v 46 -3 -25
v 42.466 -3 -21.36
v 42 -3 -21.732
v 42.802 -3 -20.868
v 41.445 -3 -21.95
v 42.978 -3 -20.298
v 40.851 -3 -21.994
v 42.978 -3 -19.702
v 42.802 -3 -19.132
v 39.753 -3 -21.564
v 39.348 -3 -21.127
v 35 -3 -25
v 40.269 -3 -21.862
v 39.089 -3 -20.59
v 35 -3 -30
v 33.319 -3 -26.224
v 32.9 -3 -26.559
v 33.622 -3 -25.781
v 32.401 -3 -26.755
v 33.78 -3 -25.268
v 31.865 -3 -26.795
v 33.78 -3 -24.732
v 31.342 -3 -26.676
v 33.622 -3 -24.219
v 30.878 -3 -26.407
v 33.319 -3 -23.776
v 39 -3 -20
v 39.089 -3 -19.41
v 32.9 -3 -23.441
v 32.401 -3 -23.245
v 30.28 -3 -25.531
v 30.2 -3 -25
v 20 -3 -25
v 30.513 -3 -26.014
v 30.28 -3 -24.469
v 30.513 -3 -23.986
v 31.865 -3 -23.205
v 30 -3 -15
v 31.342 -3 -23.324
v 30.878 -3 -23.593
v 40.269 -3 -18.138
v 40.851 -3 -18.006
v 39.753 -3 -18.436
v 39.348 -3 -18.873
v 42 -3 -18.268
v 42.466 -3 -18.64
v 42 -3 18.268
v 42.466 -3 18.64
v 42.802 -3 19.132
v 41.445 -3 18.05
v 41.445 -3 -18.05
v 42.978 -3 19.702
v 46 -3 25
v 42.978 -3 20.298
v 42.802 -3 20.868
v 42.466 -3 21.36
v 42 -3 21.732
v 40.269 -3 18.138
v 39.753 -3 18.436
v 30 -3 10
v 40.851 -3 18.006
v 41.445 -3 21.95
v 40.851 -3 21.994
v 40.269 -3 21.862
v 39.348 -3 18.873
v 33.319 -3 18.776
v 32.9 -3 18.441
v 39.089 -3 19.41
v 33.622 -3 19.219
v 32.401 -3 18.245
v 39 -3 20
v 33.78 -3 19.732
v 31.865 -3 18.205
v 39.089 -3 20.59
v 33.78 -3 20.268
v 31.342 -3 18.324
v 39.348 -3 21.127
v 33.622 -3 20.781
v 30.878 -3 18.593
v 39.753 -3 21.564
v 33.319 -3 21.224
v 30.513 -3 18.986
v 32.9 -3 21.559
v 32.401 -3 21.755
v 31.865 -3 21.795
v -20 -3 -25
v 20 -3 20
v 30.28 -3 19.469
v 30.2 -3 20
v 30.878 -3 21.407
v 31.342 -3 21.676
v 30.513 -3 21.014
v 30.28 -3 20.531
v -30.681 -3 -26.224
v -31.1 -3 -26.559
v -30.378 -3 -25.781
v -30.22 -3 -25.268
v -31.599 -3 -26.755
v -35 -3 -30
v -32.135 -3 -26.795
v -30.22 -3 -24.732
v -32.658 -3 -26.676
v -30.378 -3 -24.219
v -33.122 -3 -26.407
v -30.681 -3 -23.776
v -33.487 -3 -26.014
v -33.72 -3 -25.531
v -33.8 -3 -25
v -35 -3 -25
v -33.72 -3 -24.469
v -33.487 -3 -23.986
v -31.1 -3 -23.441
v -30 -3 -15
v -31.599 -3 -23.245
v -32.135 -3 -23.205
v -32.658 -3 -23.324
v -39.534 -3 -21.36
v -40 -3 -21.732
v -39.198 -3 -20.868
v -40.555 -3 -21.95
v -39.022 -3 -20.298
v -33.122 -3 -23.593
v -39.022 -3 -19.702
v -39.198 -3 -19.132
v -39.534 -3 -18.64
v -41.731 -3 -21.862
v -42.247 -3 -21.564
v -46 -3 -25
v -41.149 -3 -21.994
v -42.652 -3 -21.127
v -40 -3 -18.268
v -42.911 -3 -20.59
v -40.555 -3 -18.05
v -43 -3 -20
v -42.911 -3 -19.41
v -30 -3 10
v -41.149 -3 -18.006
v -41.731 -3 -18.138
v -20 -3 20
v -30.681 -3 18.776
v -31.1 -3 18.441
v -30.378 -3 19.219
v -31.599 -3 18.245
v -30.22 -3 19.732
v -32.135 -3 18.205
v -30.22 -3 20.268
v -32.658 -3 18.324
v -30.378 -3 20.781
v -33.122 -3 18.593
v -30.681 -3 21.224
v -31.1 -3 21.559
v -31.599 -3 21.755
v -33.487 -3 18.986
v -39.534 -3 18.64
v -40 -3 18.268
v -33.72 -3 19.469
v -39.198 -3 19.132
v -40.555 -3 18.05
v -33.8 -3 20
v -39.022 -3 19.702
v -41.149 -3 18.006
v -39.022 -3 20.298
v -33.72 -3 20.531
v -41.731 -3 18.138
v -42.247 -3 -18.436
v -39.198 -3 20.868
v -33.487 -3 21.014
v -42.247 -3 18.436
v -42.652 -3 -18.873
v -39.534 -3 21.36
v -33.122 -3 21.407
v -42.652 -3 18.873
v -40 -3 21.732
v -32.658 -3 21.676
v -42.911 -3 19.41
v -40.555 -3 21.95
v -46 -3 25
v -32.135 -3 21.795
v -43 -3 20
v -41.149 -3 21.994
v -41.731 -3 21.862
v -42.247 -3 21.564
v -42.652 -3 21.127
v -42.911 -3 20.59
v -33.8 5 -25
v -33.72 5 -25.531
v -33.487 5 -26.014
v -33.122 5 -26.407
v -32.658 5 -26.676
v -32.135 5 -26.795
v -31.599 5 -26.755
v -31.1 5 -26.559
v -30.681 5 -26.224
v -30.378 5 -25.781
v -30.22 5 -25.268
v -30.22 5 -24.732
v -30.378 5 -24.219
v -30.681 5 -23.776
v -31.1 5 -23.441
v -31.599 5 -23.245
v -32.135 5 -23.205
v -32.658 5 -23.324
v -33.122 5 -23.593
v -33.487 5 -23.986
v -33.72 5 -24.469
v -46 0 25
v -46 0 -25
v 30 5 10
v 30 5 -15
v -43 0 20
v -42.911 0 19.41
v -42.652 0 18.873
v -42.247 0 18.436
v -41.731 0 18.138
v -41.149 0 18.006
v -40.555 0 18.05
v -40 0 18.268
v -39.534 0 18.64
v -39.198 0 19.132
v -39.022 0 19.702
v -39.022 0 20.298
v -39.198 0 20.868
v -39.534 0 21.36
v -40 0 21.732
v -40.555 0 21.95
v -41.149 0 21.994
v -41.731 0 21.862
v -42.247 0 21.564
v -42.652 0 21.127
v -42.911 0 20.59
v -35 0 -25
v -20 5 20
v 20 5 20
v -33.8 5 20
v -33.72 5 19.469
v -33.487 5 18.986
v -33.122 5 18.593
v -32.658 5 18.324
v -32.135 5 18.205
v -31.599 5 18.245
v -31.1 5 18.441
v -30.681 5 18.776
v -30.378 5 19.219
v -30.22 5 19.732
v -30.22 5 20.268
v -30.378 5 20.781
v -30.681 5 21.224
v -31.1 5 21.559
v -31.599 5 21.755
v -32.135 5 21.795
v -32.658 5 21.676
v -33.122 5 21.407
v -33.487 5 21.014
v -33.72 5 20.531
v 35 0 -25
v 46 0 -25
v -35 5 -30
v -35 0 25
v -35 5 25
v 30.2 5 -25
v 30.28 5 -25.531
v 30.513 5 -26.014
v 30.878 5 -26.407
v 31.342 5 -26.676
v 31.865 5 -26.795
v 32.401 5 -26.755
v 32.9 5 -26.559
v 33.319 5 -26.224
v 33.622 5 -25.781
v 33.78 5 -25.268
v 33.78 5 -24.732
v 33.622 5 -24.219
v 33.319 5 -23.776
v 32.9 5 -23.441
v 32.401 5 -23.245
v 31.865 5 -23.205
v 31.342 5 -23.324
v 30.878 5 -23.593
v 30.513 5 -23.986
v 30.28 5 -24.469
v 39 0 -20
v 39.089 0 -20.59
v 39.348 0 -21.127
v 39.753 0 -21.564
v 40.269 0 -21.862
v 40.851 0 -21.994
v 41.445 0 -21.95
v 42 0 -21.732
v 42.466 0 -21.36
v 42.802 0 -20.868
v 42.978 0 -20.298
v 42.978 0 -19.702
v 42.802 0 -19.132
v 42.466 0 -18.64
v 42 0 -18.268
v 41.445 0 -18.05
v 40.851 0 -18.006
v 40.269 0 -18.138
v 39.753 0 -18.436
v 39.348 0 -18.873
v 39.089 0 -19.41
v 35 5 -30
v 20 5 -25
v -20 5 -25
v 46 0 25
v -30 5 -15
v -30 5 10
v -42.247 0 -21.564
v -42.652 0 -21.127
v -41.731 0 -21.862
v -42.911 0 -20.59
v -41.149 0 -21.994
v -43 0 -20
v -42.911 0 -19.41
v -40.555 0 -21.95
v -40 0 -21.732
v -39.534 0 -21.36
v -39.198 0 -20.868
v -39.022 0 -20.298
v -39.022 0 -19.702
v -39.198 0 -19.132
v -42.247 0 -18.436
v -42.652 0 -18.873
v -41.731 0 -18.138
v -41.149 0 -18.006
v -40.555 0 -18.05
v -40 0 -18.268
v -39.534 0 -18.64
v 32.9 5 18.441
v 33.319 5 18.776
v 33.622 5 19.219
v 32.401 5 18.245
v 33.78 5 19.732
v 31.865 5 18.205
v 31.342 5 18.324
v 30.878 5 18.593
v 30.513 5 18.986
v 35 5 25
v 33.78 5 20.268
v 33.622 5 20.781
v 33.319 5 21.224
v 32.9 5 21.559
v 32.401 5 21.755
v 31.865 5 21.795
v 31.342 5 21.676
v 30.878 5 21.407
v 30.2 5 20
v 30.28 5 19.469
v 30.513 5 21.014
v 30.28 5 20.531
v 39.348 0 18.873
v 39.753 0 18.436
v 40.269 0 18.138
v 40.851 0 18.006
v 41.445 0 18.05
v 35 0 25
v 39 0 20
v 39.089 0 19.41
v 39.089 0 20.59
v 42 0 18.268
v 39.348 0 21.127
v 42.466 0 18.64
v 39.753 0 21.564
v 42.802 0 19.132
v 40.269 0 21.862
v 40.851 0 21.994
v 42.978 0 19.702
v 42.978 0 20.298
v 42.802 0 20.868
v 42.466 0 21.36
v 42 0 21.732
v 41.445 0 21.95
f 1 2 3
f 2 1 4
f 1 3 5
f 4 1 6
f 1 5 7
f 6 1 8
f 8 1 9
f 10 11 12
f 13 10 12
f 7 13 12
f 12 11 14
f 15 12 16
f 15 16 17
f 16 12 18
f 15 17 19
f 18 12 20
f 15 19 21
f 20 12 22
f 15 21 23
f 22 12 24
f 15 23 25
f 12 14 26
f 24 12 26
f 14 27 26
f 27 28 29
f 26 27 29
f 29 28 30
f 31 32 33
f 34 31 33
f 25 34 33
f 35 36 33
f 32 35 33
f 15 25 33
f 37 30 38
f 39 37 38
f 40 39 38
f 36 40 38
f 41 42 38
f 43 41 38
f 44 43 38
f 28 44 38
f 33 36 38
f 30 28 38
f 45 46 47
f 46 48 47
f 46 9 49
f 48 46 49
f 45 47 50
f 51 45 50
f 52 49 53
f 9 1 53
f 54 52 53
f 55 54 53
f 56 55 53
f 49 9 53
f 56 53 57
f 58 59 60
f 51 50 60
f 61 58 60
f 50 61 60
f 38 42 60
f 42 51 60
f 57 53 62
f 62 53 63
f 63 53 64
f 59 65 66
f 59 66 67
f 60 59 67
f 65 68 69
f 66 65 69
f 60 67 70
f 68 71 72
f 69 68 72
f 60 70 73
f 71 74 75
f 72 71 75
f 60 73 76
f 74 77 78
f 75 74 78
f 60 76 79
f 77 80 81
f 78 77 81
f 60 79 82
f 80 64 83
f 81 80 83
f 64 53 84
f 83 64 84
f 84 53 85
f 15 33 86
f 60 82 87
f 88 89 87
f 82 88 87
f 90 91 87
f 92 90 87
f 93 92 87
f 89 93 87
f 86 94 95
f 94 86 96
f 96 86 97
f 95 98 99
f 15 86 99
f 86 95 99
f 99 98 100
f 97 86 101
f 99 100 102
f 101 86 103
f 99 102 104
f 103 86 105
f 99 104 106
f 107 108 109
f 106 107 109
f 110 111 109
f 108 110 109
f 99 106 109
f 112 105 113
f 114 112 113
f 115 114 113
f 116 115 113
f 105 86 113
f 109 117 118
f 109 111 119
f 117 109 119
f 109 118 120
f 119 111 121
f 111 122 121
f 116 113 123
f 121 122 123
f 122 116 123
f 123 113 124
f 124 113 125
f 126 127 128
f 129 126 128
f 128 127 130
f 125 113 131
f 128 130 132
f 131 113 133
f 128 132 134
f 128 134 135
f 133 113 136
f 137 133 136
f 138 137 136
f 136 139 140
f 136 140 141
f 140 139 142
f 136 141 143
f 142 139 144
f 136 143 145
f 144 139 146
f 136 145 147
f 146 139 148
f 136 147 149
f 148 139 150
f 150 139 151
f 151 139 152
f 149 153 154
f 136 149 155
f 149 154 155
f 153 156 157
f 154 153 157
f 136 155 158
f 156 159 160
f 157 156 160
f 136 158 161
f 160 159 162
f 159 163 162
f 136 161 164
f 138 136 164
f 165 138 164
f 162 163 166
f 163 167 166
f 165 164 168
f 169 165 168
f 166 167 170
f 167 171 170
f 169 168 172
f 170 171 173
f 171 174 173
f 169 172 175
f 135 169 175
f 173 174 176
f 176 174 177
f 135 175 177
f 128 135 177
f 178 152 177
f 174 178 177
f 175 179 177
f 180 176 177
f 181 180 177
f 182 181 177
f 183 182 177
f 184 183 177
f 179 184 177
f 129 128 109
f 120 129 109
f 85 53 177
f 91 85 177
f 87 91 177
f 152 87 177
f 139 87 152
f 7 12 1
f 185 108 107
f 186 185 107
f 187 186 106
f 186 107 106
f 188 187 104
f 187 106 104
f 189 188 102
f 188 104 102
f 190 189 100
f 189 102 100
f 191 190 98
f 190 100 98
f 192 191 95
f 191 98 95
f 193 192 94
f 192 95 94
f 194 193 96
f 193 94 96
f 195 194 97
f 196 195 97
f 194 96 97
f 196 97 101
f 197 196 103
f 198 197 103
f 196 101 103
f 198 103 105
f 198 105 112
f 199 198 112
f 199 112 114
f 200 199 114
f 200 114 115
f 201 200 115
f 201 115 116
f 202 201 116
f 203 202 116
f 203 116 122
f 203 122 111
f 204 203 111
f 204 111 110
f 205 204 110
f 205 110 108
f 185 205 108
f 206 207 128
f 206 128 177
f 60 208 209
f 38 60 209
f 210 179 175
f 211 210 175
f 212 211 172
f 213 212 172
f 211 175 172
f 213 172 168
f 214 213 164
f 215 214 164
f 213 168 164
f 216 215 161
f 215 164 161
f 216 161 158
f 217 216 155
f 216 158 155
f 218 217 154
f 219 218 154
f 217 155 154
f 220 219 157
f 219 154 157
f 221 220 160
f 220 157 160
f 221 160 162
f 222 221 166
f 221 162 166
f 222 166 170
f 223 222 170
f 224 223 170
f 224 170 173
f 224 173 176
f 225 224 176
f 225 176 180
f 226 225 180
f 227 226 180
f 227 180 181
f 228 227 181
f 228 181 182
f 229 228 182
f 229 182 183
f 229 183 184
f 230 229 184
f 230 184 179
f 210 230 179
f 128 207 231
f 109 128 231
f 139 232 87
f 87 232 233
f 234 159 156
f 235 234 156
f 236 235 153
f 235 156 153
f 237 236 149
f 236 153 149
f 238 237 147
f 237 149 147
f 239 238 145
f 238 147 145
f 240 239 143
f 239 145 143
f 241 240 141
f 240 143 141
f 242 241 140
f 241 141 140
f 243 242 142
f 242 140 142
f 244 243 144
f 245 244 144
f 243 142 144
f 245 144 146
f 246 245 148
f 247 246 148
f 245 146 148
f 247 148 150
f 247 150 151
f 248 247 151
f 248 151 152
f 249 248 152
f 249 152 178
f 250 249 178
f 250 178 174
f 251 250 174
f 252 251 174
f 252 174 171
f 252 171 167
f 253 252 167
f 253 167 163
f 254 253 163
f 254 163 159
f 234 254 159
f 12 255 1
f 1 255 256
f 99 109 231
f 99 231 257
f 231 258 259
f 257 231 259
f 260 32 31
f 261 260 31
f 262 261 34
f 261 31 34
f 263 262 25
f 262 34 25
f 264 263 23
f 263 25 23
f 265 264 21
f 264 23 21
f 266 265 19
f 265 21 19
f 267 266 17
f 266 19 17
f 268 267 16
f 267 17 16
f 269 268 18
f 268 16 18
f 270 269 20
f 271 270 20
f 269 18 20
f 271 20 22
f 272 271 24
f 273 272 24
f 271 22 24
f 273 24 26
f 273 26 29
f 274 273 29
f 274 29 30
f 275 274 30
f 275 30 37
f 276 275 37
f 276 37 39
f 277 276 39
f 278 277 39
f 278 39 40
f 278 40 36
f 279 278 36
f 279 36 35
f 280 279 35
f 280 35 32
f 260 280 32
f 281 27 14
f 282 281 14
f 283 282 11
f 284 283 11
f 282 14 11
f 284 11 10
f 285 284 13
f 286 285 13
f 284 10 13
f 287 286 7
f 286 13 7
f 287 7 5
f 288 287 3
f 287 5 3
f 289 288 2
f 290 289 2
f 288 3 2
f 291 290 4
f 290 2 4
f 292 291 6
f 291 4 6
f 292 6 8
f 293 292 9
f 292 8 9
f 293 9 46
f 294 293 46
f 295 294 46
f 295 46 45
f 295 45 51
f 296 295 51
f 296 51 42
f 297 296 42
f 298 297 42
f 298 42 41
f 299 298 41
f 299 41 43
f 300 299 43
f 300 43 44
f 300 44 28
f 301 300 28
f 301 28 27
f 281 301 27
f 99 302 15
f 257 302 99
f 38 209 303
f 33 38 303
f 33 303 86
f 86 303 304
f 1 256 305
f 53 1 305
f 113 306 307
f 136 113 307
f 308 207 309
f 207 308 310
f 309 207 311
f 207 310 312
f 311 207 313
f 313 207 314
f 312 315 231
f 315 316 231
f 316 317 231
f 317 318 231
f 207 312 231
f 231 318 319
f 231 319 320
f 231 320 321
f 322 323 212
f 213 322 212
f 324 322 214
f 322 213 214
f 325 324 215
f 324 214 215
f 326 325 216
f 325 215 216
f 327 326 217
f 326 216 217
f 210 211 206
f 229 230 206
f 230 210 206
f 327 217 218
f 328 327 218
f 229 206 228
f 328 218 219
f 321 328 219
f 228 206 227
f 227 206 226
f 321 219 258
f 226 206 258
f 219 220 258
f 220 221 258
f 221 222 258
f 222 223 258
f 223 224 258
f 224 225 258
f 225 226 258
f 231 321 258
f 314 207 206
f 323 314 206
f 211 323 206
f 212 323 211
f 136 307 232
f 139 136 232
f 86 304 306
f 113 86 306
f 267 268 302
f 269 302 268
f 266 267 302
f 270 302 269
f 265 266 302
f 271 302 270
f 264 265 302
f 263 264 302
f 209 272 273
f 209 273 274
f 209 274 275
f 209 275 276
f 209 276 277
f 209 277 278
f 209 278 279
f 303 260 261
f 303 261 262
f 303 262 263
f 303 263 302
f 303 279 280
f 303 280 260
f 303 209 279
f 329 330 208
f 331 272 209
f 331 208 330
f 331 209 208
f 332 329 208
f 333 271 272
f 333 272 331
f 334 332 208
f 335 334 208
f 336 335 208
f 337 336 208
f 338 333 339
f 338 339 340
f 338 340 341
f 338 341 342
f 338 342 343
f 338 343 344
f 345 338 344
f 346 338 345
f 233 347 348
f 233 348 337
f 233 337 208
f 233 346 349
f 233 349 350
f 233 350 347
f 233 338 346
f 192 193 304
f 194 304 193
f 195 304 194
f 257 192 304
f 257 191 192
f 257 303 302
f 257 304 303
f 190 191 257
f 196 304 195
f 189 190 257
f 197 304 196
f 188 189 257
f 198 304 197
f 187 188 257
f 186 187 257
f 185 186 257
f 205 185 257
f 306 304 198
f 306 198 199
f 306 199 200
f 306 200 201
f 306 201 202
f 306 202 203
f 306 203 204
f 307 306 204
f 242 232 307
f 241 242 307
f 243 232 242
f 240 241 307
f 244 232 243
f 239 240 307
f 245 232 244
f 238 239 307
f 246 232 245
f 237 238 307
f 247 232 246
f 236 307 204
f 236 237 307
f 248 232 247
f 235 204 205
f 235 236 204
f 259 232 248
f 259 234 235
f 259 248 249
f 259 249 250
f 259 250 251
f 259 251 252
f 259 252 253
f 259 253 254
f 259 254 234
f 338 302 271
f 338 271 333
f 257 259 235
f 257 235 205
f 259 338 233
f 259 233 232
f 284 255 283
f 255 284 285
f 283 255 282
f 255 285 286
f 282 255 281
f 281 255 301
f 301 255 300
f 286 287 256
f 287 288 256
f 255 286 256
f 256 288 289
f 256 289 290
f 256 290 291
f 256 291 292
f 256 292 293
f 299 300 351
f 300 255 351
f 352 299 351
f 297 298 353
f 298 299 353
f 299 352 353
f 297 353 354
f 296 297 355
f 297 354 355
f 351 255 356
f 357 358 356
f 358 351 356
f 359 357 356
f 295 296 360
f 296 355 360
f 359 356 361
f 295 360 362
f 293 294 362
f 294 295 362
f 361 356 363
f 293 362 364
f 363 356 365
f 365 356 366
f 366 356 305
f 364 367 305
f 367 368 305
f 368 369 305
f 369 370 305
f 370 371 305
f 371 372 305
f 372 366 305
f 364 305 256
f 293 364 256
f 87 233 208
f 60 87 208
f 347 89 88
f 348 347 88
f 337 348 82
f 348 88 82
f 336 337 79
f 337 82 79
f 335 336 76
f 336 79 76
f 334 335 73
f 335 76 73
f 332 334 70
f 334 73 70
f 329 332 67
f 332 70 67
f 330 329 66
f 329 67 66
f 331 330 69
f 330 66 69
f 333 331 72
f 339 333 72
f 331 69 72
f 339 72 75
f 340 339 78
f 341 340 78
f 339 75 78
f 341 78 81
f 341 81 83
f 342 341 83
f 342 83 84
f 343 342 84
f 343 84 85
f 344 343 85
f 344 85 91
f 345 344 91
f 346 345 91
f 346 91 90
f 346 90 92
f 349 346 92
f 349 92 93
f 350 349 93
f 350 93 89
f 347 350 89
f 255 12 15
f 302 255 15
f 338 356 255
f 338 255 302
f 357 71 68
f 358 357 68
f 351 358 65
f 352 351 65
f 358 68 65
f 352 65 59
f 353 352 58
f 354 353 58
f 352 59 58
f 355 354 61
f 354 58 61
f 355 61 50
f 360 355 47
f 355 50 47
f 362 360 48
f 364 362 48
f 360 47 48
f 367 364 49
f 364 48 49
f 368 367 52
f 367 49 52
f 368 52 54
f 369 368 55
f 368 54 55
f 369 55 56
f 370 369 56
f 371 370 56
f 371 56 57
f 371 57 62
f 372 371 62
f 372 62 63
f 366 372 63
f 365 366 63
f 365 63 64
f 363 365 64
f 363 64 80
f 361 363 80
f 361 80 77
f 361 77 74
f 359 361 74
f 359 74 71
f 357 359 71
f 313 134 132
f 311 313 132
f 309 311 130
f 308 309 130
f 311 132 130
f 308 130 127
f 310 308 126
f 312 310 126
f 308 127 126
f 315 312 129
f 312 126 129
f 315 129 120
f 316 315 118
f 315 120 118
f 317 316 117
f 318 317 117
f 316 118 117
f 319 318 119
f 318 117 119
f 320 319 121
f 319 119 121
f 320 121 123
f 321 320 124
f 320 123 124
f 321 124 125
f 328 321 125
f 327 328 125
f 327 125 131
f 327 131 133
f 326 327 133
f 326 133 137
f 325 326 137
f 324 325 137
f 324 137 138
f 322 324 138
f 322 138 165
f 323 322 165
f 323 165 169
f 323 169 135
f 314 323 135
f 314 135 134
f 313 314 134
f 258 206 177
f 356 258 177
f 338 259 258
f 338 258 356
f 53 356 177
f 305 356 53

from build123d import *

# Parameters (mm, degrees)
SKETCH1_W                = 70
SKETCH1_H                = 50
BOSS_EXTRUDE1_DEPTH      = 5
SKETCH2_W                = 92
SKETCH2_H                = 50
BOSS_EXTRUDE2_DEPTH      = 3
M3_CLEARANCE_HOLE1_D     = 4
M3_CLEARANCE_HOLE1_DEPTH = 10
M3_CLEARANCE_HOLE1_TIP   = 1.201721238
SKETCH9_W                = 70
SKETCH9_H                = 8
BOSS_EXTRUDE3_DEPTH      = 5
M3_CLEARANCE_HOLE3_D     = 3.6
M3_CLEARANCE_HOLE3_DEPTH = 10
M3_CLEARANCE_HOLE3_TIP   = 1.081549114
CUT_EXTRUDE1_DEPTH       = 56.497747702


with BuildPart() as part:
    # Sketch1 → Boss-Extrude1 (new body)
    with BuildSketch(Plane(origin=(0, 0, 0), x_dir=(1, 0, 0), z_dir=(0, 1, 0))):
        Rectangle(SKETCH1_W, SKETCH1_H)
    extrude(amount=BOSS_EXTRUDE1_DEPTH)

    # Sketch2 → Boss-Extrude2 (add)
    with BuildSketch(Plane.XZ):
        Rectangle(SKETCH2_W, SKETCH2_H)
    extrude(amount=BOSS_EXTRUDE2_DEPTH)

    # M3 Clearance Hole1
    with Locations(Plane(origin=(0, 0, 0), x_dir=(1, 0, 0), z_dir=(0, 1, 0))):
        with Locations((-41, 20), (-41, -20), (41, 20), (41, -20)):
            Hole(M3_CLEARANCE_HOLE1_D / 2, depth=M3_CLEARANCE_HOLE1_DEPTH)
            with Locations((0, 0, -(M3_CLEARANCE_HOLE1_DEPTH + M3_CLEARANCE_HOLE1_TIP / 2))):  # 118° drill point
                Cone(0, M3_CLEARANCE_HOLE1_D / 2, M3_CLEARANCE_HOLE1_TIP, mode=Mode.SUBTRACT)

    # Sketch9 → Boss-Extrude3 (add)
    with BuildSketch(Plane(origin=(0, 0, -25), x_dir=(-1, 0, 0), z_dir=(0, 0, -1))):
        with Locations((0, 1)):
            Rectangle(SKETCH9_W, SKETCH9_H)
    extrude(amount=BOSS_EXTRUDE3_DEPTH)

    # M3 Clearance Hole3
    with Locations(Plane(origin=(0, 5, 0), x_dir=(1, 0, 0), z_dir=(0, 1, 0))):
        with Locations((32, -20), (-32, 25), (32, 25), (-32, -20)):
            Hole(M3_CLEARANCE_HOLE3_D / 2, depth=M3_CLEARANCE_HOLE3_DEPTH)
            with Locations((0, 0, -(M3_CLEARANCE_HOLE3_DEPTH + M3_CLEARANCE_HOLE3_TIP / 2))):  # 118° drill point
                Cone(0, M3_CLEARANCE_HOLE3_D / 2, M3_CLEARANCE_HOLE3_TIP, mode=Mode.SUBTRACT)

    # Sketch12 → Cut-Extrude1 (cut, through all)
    with BuildSketch(Plane(origin=(0, 5, 0), x_dir=(1, 0, 0), z_dir=(0, 1, 0))):
        Polygon((20, -20), (30, -10), (30, 15), (20, 25), (-20, 25), (-30, 15), (-30, -10), (-20, -20), align=None)
    extrude(amount=-CUT_EXTRUDE1_DEPTH, mode=Mode.SUBTRACT)


solid = part.part
